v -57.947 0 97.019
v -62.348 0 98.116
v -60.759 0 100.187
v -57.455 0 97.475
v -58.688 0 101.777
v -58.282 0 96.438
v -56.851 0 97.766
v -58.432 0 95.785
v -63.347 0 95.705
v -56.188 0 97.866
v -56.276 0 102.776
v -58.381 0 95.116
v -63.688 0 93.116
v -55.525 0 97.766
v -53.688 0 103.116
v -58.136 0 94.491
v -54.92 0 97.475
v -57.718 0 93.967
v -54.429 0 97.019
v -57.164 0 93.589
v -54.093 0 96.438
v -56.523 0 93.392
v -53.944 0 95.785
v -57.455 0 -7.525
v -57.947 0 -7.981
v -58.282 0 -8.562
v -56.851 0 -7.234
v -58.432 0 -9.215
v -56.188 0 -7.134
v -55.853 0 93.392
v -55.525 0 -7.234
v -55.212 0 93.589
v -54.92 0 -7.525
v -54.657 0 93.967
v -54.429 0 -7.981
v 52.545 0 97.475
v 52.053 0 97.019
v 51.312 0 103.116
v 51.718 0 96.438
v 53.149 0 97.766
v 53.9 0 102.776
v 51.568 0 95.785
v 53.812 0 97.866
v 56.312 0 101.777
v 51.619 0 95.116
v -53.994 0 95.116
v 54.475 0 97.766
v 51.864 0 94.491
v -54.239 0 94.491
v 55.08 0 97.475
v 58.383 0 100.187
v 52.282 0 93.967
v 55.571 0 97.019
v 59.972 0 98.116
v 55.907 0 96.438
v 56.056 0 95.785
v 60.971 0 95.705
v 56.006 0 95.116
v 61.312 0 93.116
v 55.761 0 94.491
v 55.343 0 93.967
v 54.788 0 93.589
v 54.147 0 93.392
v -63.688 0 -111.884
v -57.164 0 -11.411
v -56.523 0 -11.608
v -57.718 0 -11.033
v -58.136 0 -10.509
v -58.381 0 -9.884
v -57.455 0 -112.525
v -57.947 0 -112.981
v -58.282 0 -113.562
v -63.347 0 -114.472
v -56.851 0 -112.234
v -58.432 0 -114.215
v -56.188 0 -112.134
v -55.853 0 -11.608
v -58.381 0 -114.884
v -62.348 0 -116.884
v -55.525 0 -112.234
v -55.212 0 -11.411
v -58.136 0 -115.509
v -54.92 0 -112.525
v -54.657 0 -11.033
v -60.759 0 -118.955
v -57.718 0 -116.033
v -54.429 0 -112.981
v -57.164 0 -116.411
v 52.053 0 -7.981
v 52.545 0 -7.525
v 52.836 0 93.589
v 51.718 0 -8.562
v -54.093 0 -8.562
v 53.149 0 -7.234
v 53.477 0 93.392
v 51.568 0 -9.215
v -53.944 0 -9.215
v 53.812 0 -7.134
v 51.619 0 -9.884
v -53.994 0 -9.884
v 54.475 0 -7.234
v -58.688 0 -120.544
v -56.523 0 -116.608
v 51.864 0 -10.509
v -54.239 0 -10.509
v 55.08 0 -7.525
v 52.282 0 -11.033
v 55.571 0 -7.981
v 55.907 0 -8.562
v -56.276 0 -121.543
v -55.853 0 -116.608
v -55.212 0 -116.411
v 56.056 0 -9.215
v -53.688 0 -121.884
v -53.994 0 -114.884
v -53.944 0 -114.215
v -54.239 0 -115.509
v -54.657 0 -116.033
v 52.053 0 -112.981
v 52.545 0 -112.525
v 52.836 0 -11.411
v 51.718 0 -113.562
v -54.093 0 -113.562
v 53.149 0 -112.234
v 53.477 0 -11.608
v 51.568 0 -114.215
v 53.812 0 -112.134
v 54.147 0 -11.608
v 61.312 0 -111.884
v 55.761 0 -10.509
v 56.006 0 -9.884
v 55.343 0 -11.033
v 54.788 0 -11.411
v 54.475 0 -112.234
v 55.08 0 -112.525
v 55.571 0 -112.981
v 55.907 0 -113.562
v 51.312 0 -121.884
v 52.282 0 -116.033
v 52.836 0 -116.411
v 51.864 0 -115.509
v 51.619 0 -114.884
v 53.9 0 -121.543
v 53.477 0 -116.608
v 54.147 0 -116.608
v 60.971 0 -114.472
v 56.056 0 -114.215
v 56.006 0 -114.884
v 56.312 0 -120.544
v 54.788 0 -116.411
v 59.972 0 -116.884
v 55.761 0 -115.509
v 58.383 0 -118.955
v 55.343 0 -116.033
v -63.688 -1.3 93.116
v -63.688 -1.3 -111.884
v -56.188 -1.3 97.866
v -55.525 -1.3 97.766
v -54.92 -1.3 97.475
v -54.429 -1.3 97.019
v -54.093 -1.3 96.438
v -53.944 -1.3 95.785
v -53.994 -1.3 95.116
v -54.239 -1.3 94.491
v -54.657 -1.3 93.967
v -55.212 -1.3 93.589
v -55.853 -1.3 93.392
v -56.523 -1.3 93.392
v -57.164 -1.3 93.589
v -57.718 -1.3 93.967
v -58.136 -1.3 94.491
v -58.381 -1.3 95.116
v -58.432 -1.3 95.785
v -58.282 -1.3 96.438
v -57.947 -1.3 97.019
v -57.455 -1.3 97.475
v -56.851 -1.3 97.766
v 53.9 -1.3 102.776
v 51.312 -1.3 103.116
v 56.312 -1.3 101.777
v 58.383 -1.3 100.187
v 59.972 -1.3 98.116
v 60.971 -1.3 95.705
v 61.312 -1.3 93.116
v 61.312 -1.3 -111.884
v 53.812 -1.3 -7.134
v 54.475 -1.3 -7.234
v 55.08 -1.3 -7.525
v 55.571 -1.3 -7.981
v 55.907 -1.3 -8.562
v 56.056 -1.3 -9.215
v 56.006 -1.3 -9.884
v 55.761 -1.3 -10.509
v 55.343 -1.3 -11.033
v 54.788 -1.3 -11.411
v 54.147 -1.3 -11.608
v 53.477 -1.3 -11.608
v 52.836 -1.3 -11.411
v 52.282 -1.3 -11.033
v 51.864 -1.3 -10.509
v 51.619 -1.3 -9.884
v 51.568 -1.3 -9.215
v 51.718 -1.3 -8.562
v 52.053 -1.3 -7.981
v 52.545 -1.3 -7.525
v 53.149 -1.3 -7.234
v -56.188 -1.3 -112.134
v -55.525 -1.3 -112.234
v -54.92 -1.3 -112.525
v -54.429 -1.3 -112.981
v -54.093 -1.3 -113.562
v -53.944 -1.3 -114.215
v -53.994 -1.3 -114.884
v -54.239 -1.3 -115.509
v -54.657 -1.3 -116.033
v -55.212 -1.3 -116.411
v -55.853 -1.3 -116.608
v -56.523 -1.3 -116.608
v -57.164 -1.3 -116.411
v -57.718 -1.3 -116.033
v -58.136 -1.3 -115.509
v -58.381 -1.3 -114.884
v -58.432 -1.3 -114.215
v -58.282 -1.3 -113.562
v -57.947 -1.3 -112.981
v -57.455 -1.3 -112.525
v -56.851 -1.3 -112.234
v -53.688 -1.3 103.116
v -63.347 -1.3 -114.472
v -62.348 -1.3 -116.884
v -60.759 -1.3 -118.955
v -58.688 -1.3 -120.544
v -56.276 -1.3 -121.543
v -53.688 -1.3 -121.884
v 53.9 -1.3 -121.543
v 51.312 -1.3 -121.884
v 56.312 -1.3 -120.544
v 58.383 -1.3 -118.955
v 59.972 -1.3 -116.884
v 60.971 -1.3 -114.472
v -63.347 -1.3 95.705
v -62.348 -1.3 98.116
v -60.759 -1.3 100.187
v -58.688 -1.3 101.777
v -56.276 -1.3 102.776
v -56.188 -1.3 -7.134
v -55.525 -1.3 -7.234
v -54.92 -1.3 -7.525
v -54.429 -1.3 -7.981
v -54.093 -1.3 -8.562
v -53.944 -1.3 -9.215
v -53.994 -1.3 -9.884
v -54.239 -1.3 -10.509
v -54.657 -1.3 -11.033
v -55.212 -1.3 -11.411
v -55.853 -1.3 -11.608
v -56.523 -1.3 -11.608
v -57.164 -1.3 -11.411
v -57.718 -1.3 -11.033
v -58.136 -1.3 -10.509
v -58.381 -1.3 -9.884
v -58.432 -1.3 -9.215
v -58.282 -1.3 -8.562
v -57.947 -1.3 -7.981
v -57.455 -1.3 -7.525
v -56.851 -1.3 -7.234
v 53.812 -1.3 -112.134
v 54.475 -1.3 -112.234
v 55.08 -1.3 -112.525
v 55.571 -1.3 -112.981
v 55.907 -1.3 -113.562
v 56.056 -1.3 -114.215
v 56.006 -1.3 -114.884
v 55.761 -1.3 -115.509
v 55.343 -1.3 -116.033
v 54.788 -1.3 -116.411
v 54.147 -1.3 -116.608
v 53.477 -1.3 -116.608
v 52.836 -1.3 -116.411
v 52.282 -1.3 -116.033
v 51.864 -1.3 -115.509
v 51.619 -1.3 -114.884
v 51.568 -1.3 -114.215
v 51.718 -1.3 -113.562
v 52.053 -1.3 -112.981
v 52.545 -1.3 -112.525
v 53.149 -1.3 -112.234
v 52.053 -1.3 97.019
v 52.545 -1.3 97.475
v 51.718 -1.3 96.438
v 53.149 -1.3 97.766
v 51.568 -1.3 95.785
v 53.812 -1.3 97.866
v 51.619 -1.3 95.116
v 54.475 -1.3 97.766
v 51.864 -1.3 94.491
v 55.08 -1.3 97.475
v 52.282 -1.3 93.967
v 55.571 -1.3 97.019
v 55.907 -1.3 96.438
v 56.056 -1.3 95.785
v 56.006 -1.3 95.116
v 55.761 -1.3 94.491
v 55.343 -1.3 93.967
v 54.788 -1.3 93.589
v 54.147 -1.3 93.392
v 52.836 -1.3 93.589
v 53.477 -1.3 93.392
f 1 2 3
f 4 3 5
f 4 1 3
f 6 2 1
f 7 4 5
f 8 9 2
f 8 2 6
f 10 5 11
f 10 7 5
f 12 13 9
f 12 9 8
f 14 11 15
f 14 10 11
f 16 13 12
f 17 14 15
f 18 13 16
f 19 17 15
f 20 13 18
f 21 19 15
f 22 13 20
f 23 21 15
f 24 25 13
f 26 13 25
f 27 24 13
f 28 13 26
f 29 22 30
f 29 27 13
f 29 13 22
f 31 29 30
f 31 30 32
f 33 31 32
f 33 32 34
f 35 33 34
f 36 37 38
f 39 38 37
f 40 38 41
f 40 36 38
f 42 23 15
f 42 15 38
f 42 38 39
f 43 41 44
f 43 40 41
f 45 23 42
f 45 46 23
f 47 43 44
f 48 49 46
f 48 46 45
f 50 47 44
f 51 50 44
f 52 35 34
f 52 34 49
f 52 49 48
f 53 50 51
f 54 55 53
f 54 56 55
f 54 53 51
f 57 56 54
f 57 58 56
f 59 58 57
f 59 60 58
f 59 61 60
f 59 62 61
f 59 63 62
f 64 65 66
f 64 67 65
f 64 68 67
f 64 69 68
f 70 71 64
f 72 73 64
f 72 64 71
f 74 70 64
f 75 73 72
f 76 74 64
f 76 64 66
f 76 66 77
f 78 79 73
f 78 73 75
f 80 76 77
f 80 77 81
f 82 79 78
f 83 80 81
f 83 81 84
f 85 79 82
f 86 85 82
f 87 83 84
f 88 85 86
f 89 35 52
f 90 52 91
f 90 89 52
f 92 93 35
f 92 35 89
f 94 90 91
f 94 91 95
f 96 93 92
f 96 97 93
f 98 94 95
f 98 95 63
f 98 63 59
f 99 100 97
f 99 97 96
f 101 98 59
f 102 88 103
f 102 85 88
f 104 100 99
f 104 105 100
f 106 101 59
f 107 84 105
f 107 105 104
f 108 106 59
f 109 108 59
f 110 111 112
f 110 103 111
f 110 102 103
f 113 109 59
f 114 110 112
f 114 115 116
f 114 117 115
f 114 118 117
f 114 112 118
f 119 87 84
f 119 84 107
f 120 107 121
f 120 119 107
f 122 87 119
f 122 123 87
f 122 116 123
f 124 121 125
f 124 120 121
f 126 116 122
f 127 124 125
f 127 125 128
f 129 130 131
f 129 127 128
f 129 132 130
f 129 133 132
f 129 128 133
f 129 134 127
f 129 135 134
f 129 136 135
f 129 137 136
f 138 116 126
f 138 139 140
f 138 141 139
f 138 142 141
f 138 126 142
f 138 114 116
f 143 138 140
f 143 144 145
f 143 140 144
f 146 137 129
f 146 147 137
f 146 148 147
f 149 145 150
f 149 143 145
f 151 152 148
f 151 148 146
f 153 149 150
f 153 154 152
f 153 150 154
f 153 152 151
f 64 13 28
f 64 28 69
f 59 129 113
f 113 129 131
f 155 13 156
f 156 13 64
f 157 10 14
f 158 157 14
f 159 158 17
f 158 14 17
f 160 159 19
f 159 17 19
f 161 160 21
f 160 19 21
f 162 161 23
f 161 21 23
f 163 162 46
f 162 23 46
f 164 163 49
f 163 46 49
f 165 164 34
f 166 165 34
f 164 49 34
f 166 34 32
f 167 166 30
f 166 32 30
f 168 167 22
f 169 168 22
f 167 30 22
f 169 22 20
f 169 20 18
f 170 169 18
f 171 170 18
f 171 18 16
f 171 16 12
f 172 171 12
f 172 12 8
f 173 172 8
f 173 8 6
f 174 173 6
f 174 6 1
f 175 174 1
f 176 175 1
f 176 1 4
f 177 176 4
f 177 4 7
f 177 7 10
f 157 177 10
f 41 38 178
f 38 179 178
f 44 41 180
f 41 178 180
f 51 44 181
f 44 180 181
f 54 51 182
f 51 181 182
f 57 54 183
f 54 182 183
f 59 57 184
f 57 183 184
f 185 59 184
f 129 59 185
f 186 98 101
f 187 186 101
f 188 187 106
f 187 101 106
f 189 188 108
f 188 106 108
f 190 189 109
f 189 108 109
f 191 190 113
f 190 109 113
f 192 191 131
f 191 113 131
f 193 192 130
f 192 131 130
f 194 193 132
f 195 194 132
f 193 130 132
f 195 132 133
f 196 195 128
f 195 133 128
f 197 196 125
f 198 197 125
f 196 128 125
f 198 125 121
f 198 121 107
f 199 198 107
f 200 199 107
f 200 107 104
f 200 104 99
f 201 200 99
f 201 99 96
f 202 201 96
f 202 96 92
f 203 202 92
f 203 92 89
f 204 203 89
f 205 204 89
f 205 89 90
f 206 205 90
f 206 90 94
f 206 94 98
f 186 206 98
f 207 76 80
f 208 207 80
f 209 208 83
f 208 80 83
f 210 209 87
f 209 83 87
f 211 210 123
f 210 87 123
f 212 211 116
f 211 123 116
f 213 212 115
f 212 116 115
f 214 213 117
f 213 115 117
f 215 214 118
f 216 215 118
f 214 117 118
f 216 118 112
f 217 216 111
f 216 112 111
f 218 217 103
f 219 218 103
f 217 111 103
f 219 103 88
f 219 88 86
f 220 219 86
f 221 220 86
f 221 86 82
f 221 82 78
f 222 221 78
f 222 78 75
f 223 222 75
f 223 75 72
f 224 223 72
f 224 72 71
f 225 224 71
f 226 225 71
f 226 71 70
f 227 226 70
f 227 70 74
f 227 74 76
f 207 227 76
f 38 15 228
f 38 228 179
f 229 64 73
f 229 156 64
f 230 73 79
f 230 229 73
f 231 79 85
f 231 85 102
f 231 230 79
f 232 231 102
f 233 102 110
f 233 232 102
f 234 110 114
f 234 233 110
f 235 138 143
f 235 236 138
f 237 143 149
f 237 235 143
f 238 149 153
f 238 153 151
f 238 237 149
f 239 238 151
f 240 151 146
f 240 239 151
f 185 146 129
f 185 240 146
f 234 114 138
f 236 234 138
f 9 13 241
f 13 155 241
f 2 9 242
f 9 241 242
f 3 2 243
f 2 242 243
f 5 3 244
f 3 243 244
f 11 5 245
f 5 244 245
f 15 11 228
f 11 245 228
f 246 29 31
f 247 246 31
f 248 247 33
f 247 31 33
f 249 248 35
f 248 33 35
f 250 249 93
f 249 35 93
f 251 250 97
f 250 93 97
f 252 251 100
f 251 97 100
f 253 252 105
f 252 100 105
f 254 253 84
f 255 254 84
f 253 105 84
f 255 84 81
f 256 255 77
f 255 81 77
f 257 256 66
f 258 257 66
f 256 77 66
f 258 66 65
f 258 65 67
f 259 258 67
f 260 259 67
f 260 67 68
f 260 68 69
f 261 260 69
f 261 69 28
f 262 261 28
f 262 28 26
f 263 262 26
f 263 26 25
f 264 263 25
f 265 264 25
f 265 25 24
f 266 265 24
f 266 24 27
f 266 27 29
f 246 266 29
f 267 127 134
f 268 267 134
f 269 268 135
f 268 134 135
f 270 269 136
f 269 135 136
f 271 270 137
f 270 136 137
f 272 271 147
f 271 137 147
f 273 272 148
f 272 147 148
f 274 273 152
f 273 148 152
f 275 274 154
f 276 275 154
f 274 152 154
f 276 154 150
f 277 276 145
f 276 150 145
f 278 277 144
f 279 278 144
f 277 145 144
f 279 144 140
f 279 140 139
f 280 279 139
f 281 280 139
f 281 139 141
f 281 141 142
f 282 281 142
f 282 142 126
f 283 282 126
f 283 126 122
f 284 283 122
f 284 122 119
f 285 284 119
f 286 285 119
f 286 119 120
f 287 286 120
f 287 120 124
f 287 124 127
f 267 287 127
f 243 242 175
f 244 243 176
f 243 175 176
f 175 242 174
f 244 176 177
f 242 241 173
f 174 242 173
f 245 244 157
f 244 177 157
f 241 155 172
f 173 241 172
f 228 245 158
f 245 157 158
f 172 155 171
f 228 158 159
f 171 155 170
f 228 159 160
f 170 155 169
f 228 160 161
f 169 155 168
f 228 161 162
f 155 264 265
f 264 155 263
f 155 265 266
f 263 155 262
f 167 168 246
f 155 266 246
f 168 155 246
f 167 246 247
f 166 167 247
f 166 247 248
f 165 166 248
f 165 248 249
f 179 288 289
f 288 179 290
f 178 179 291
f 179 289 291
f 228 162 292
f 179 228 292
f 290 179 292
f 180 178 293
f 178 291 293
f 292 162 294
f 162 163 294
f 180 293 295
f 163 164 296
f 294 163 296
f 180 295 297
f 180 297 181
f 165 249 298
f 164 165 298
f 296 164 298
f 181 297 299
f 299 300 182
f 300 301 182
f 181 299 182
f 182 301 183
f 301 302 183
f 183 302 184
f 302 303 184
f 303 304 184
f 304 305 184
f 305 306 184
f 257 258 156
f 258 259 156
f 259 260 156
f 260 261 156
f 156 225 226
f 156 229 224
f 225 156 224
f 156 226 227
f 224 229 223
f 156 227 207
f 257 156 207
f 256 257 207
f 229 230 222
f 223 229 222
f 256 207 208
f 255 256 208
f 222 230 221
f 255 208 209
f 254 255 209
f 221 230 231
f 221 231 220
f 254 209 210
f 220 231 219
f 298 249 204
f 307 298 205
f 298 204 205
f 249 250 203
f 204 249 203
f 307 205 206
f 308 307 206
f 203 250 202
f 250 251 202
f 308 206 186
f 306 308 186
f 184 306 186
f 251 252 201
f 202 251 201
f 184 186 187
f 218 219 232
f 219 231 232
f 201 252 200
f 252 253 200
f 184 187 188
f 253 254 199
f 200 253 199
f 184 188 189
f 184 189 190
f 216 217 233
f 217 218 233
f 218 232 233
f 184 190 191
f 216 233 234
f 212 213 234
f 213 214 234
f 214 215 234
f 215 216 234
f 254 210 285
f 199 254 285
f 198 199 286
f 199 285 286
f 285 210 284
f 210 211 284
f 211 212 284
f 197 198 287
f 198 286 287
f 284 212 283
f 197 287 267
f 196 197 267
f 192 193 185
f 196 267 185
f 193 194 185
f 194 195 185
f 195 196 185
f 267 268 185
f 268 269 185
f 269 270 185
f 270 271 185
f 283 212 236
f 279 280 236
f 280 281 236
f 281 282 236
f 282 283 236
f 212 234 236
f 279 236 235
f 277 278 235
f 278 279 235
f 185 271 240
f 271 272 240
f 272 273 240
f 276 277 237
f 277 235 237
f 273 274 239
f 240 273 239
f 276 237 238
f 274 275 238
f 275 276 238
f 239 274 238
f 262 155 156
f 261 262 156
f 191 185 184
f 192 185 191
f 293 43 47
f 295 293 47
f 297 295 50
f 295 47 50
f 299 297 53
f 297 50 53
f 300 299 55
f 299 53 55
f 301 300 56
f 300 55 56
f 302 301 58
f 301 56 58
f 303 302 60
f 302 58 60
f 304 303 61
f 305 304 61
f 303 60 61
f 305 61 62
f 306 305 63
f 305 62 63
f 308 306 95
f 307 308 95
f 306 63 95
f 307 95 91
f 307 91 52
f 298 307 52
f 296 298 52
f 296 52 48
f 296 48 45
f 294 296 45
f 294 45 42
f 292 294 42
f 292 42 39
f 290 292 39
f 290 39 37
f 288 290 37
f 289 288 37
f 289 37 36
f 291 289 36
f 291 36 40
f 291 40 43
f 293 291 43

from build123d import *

# Parameters (mm, degrees)
SKETCH1_W          = 125
SKETCH1_H          = 225
BASE_FLANGE1_DEPTH = 1.3
SKETCH6_R          = 2.25
CUT_EXTRUDE1_DEPTH = 10
FILLET1_R          = 10


# Sheet-metal steps are written as plain solids
with BuildPart() as part:
    # Sketch1 → Base-Flange1 (new body)
    with BuildSketch(Plane(origin=(0, 0, 0), x_dir=(1, 0, 0), z_dir=(0, 1, 0))):
        with Locations((-1.187869711, 9.383580575)):
            Rectangle(SKETCH1_W, SKETCH1_H)
    extrude(amount=-BASE_FLANGE1_DEPTH)

    # Sketch6 → Cut-Extrude1 (cut)
    with BuildSketch(Plane(origin=(0, 0, 0), x_dir=(1, 0, 0), z_dir=(0, 1, 0))):
        with Locations(Location((53.812130289, 114.383580575, 0), (0, 0, 270))):
            Circle(SKETCH6_R)
        with Locations(Location((53.812130289, -95.616419425, 0), (0, 0, 270))):
            Circle(SKETCH6_R)
        with Locations(Location((-56.187869711, -95.616419425, 0), (0, 0, 270))):
            Circle(SKETCH6_R)
        with Locations(Location((-56.187869711, 114.383580575, 0), (0, 0, 270))):
            Circle(SKETCH6_R)
        with Locations(Location((53.812130289, 9.383580575, 0), (0, 0, 270))):
            Circle(SKETCH6_R)
        with Locations(Location((-56.187869711, 9.383580575, 0), (0, 0, 270))):
            Circle(SKETCH6_R)
    extrude(amount=-CUT_EXTRUDE1_DEPTH, mode=Mode.SUBTRACT)

    # Fillet1
    fillet1_edges = [part.edges().sort_by_distance(p)[0] for p in [
        (61.312130289, -0.65, 103.116419425),
        (-63.687869711, -0.65, 103.116419425),
        (-63.687869711, -0.65, -121.883580575),
        (61.312130289, -0.65, -121.883580575),
    ]]
    fillet(fillet1_edges, radius=FILLET1_R)


solid = part.part
